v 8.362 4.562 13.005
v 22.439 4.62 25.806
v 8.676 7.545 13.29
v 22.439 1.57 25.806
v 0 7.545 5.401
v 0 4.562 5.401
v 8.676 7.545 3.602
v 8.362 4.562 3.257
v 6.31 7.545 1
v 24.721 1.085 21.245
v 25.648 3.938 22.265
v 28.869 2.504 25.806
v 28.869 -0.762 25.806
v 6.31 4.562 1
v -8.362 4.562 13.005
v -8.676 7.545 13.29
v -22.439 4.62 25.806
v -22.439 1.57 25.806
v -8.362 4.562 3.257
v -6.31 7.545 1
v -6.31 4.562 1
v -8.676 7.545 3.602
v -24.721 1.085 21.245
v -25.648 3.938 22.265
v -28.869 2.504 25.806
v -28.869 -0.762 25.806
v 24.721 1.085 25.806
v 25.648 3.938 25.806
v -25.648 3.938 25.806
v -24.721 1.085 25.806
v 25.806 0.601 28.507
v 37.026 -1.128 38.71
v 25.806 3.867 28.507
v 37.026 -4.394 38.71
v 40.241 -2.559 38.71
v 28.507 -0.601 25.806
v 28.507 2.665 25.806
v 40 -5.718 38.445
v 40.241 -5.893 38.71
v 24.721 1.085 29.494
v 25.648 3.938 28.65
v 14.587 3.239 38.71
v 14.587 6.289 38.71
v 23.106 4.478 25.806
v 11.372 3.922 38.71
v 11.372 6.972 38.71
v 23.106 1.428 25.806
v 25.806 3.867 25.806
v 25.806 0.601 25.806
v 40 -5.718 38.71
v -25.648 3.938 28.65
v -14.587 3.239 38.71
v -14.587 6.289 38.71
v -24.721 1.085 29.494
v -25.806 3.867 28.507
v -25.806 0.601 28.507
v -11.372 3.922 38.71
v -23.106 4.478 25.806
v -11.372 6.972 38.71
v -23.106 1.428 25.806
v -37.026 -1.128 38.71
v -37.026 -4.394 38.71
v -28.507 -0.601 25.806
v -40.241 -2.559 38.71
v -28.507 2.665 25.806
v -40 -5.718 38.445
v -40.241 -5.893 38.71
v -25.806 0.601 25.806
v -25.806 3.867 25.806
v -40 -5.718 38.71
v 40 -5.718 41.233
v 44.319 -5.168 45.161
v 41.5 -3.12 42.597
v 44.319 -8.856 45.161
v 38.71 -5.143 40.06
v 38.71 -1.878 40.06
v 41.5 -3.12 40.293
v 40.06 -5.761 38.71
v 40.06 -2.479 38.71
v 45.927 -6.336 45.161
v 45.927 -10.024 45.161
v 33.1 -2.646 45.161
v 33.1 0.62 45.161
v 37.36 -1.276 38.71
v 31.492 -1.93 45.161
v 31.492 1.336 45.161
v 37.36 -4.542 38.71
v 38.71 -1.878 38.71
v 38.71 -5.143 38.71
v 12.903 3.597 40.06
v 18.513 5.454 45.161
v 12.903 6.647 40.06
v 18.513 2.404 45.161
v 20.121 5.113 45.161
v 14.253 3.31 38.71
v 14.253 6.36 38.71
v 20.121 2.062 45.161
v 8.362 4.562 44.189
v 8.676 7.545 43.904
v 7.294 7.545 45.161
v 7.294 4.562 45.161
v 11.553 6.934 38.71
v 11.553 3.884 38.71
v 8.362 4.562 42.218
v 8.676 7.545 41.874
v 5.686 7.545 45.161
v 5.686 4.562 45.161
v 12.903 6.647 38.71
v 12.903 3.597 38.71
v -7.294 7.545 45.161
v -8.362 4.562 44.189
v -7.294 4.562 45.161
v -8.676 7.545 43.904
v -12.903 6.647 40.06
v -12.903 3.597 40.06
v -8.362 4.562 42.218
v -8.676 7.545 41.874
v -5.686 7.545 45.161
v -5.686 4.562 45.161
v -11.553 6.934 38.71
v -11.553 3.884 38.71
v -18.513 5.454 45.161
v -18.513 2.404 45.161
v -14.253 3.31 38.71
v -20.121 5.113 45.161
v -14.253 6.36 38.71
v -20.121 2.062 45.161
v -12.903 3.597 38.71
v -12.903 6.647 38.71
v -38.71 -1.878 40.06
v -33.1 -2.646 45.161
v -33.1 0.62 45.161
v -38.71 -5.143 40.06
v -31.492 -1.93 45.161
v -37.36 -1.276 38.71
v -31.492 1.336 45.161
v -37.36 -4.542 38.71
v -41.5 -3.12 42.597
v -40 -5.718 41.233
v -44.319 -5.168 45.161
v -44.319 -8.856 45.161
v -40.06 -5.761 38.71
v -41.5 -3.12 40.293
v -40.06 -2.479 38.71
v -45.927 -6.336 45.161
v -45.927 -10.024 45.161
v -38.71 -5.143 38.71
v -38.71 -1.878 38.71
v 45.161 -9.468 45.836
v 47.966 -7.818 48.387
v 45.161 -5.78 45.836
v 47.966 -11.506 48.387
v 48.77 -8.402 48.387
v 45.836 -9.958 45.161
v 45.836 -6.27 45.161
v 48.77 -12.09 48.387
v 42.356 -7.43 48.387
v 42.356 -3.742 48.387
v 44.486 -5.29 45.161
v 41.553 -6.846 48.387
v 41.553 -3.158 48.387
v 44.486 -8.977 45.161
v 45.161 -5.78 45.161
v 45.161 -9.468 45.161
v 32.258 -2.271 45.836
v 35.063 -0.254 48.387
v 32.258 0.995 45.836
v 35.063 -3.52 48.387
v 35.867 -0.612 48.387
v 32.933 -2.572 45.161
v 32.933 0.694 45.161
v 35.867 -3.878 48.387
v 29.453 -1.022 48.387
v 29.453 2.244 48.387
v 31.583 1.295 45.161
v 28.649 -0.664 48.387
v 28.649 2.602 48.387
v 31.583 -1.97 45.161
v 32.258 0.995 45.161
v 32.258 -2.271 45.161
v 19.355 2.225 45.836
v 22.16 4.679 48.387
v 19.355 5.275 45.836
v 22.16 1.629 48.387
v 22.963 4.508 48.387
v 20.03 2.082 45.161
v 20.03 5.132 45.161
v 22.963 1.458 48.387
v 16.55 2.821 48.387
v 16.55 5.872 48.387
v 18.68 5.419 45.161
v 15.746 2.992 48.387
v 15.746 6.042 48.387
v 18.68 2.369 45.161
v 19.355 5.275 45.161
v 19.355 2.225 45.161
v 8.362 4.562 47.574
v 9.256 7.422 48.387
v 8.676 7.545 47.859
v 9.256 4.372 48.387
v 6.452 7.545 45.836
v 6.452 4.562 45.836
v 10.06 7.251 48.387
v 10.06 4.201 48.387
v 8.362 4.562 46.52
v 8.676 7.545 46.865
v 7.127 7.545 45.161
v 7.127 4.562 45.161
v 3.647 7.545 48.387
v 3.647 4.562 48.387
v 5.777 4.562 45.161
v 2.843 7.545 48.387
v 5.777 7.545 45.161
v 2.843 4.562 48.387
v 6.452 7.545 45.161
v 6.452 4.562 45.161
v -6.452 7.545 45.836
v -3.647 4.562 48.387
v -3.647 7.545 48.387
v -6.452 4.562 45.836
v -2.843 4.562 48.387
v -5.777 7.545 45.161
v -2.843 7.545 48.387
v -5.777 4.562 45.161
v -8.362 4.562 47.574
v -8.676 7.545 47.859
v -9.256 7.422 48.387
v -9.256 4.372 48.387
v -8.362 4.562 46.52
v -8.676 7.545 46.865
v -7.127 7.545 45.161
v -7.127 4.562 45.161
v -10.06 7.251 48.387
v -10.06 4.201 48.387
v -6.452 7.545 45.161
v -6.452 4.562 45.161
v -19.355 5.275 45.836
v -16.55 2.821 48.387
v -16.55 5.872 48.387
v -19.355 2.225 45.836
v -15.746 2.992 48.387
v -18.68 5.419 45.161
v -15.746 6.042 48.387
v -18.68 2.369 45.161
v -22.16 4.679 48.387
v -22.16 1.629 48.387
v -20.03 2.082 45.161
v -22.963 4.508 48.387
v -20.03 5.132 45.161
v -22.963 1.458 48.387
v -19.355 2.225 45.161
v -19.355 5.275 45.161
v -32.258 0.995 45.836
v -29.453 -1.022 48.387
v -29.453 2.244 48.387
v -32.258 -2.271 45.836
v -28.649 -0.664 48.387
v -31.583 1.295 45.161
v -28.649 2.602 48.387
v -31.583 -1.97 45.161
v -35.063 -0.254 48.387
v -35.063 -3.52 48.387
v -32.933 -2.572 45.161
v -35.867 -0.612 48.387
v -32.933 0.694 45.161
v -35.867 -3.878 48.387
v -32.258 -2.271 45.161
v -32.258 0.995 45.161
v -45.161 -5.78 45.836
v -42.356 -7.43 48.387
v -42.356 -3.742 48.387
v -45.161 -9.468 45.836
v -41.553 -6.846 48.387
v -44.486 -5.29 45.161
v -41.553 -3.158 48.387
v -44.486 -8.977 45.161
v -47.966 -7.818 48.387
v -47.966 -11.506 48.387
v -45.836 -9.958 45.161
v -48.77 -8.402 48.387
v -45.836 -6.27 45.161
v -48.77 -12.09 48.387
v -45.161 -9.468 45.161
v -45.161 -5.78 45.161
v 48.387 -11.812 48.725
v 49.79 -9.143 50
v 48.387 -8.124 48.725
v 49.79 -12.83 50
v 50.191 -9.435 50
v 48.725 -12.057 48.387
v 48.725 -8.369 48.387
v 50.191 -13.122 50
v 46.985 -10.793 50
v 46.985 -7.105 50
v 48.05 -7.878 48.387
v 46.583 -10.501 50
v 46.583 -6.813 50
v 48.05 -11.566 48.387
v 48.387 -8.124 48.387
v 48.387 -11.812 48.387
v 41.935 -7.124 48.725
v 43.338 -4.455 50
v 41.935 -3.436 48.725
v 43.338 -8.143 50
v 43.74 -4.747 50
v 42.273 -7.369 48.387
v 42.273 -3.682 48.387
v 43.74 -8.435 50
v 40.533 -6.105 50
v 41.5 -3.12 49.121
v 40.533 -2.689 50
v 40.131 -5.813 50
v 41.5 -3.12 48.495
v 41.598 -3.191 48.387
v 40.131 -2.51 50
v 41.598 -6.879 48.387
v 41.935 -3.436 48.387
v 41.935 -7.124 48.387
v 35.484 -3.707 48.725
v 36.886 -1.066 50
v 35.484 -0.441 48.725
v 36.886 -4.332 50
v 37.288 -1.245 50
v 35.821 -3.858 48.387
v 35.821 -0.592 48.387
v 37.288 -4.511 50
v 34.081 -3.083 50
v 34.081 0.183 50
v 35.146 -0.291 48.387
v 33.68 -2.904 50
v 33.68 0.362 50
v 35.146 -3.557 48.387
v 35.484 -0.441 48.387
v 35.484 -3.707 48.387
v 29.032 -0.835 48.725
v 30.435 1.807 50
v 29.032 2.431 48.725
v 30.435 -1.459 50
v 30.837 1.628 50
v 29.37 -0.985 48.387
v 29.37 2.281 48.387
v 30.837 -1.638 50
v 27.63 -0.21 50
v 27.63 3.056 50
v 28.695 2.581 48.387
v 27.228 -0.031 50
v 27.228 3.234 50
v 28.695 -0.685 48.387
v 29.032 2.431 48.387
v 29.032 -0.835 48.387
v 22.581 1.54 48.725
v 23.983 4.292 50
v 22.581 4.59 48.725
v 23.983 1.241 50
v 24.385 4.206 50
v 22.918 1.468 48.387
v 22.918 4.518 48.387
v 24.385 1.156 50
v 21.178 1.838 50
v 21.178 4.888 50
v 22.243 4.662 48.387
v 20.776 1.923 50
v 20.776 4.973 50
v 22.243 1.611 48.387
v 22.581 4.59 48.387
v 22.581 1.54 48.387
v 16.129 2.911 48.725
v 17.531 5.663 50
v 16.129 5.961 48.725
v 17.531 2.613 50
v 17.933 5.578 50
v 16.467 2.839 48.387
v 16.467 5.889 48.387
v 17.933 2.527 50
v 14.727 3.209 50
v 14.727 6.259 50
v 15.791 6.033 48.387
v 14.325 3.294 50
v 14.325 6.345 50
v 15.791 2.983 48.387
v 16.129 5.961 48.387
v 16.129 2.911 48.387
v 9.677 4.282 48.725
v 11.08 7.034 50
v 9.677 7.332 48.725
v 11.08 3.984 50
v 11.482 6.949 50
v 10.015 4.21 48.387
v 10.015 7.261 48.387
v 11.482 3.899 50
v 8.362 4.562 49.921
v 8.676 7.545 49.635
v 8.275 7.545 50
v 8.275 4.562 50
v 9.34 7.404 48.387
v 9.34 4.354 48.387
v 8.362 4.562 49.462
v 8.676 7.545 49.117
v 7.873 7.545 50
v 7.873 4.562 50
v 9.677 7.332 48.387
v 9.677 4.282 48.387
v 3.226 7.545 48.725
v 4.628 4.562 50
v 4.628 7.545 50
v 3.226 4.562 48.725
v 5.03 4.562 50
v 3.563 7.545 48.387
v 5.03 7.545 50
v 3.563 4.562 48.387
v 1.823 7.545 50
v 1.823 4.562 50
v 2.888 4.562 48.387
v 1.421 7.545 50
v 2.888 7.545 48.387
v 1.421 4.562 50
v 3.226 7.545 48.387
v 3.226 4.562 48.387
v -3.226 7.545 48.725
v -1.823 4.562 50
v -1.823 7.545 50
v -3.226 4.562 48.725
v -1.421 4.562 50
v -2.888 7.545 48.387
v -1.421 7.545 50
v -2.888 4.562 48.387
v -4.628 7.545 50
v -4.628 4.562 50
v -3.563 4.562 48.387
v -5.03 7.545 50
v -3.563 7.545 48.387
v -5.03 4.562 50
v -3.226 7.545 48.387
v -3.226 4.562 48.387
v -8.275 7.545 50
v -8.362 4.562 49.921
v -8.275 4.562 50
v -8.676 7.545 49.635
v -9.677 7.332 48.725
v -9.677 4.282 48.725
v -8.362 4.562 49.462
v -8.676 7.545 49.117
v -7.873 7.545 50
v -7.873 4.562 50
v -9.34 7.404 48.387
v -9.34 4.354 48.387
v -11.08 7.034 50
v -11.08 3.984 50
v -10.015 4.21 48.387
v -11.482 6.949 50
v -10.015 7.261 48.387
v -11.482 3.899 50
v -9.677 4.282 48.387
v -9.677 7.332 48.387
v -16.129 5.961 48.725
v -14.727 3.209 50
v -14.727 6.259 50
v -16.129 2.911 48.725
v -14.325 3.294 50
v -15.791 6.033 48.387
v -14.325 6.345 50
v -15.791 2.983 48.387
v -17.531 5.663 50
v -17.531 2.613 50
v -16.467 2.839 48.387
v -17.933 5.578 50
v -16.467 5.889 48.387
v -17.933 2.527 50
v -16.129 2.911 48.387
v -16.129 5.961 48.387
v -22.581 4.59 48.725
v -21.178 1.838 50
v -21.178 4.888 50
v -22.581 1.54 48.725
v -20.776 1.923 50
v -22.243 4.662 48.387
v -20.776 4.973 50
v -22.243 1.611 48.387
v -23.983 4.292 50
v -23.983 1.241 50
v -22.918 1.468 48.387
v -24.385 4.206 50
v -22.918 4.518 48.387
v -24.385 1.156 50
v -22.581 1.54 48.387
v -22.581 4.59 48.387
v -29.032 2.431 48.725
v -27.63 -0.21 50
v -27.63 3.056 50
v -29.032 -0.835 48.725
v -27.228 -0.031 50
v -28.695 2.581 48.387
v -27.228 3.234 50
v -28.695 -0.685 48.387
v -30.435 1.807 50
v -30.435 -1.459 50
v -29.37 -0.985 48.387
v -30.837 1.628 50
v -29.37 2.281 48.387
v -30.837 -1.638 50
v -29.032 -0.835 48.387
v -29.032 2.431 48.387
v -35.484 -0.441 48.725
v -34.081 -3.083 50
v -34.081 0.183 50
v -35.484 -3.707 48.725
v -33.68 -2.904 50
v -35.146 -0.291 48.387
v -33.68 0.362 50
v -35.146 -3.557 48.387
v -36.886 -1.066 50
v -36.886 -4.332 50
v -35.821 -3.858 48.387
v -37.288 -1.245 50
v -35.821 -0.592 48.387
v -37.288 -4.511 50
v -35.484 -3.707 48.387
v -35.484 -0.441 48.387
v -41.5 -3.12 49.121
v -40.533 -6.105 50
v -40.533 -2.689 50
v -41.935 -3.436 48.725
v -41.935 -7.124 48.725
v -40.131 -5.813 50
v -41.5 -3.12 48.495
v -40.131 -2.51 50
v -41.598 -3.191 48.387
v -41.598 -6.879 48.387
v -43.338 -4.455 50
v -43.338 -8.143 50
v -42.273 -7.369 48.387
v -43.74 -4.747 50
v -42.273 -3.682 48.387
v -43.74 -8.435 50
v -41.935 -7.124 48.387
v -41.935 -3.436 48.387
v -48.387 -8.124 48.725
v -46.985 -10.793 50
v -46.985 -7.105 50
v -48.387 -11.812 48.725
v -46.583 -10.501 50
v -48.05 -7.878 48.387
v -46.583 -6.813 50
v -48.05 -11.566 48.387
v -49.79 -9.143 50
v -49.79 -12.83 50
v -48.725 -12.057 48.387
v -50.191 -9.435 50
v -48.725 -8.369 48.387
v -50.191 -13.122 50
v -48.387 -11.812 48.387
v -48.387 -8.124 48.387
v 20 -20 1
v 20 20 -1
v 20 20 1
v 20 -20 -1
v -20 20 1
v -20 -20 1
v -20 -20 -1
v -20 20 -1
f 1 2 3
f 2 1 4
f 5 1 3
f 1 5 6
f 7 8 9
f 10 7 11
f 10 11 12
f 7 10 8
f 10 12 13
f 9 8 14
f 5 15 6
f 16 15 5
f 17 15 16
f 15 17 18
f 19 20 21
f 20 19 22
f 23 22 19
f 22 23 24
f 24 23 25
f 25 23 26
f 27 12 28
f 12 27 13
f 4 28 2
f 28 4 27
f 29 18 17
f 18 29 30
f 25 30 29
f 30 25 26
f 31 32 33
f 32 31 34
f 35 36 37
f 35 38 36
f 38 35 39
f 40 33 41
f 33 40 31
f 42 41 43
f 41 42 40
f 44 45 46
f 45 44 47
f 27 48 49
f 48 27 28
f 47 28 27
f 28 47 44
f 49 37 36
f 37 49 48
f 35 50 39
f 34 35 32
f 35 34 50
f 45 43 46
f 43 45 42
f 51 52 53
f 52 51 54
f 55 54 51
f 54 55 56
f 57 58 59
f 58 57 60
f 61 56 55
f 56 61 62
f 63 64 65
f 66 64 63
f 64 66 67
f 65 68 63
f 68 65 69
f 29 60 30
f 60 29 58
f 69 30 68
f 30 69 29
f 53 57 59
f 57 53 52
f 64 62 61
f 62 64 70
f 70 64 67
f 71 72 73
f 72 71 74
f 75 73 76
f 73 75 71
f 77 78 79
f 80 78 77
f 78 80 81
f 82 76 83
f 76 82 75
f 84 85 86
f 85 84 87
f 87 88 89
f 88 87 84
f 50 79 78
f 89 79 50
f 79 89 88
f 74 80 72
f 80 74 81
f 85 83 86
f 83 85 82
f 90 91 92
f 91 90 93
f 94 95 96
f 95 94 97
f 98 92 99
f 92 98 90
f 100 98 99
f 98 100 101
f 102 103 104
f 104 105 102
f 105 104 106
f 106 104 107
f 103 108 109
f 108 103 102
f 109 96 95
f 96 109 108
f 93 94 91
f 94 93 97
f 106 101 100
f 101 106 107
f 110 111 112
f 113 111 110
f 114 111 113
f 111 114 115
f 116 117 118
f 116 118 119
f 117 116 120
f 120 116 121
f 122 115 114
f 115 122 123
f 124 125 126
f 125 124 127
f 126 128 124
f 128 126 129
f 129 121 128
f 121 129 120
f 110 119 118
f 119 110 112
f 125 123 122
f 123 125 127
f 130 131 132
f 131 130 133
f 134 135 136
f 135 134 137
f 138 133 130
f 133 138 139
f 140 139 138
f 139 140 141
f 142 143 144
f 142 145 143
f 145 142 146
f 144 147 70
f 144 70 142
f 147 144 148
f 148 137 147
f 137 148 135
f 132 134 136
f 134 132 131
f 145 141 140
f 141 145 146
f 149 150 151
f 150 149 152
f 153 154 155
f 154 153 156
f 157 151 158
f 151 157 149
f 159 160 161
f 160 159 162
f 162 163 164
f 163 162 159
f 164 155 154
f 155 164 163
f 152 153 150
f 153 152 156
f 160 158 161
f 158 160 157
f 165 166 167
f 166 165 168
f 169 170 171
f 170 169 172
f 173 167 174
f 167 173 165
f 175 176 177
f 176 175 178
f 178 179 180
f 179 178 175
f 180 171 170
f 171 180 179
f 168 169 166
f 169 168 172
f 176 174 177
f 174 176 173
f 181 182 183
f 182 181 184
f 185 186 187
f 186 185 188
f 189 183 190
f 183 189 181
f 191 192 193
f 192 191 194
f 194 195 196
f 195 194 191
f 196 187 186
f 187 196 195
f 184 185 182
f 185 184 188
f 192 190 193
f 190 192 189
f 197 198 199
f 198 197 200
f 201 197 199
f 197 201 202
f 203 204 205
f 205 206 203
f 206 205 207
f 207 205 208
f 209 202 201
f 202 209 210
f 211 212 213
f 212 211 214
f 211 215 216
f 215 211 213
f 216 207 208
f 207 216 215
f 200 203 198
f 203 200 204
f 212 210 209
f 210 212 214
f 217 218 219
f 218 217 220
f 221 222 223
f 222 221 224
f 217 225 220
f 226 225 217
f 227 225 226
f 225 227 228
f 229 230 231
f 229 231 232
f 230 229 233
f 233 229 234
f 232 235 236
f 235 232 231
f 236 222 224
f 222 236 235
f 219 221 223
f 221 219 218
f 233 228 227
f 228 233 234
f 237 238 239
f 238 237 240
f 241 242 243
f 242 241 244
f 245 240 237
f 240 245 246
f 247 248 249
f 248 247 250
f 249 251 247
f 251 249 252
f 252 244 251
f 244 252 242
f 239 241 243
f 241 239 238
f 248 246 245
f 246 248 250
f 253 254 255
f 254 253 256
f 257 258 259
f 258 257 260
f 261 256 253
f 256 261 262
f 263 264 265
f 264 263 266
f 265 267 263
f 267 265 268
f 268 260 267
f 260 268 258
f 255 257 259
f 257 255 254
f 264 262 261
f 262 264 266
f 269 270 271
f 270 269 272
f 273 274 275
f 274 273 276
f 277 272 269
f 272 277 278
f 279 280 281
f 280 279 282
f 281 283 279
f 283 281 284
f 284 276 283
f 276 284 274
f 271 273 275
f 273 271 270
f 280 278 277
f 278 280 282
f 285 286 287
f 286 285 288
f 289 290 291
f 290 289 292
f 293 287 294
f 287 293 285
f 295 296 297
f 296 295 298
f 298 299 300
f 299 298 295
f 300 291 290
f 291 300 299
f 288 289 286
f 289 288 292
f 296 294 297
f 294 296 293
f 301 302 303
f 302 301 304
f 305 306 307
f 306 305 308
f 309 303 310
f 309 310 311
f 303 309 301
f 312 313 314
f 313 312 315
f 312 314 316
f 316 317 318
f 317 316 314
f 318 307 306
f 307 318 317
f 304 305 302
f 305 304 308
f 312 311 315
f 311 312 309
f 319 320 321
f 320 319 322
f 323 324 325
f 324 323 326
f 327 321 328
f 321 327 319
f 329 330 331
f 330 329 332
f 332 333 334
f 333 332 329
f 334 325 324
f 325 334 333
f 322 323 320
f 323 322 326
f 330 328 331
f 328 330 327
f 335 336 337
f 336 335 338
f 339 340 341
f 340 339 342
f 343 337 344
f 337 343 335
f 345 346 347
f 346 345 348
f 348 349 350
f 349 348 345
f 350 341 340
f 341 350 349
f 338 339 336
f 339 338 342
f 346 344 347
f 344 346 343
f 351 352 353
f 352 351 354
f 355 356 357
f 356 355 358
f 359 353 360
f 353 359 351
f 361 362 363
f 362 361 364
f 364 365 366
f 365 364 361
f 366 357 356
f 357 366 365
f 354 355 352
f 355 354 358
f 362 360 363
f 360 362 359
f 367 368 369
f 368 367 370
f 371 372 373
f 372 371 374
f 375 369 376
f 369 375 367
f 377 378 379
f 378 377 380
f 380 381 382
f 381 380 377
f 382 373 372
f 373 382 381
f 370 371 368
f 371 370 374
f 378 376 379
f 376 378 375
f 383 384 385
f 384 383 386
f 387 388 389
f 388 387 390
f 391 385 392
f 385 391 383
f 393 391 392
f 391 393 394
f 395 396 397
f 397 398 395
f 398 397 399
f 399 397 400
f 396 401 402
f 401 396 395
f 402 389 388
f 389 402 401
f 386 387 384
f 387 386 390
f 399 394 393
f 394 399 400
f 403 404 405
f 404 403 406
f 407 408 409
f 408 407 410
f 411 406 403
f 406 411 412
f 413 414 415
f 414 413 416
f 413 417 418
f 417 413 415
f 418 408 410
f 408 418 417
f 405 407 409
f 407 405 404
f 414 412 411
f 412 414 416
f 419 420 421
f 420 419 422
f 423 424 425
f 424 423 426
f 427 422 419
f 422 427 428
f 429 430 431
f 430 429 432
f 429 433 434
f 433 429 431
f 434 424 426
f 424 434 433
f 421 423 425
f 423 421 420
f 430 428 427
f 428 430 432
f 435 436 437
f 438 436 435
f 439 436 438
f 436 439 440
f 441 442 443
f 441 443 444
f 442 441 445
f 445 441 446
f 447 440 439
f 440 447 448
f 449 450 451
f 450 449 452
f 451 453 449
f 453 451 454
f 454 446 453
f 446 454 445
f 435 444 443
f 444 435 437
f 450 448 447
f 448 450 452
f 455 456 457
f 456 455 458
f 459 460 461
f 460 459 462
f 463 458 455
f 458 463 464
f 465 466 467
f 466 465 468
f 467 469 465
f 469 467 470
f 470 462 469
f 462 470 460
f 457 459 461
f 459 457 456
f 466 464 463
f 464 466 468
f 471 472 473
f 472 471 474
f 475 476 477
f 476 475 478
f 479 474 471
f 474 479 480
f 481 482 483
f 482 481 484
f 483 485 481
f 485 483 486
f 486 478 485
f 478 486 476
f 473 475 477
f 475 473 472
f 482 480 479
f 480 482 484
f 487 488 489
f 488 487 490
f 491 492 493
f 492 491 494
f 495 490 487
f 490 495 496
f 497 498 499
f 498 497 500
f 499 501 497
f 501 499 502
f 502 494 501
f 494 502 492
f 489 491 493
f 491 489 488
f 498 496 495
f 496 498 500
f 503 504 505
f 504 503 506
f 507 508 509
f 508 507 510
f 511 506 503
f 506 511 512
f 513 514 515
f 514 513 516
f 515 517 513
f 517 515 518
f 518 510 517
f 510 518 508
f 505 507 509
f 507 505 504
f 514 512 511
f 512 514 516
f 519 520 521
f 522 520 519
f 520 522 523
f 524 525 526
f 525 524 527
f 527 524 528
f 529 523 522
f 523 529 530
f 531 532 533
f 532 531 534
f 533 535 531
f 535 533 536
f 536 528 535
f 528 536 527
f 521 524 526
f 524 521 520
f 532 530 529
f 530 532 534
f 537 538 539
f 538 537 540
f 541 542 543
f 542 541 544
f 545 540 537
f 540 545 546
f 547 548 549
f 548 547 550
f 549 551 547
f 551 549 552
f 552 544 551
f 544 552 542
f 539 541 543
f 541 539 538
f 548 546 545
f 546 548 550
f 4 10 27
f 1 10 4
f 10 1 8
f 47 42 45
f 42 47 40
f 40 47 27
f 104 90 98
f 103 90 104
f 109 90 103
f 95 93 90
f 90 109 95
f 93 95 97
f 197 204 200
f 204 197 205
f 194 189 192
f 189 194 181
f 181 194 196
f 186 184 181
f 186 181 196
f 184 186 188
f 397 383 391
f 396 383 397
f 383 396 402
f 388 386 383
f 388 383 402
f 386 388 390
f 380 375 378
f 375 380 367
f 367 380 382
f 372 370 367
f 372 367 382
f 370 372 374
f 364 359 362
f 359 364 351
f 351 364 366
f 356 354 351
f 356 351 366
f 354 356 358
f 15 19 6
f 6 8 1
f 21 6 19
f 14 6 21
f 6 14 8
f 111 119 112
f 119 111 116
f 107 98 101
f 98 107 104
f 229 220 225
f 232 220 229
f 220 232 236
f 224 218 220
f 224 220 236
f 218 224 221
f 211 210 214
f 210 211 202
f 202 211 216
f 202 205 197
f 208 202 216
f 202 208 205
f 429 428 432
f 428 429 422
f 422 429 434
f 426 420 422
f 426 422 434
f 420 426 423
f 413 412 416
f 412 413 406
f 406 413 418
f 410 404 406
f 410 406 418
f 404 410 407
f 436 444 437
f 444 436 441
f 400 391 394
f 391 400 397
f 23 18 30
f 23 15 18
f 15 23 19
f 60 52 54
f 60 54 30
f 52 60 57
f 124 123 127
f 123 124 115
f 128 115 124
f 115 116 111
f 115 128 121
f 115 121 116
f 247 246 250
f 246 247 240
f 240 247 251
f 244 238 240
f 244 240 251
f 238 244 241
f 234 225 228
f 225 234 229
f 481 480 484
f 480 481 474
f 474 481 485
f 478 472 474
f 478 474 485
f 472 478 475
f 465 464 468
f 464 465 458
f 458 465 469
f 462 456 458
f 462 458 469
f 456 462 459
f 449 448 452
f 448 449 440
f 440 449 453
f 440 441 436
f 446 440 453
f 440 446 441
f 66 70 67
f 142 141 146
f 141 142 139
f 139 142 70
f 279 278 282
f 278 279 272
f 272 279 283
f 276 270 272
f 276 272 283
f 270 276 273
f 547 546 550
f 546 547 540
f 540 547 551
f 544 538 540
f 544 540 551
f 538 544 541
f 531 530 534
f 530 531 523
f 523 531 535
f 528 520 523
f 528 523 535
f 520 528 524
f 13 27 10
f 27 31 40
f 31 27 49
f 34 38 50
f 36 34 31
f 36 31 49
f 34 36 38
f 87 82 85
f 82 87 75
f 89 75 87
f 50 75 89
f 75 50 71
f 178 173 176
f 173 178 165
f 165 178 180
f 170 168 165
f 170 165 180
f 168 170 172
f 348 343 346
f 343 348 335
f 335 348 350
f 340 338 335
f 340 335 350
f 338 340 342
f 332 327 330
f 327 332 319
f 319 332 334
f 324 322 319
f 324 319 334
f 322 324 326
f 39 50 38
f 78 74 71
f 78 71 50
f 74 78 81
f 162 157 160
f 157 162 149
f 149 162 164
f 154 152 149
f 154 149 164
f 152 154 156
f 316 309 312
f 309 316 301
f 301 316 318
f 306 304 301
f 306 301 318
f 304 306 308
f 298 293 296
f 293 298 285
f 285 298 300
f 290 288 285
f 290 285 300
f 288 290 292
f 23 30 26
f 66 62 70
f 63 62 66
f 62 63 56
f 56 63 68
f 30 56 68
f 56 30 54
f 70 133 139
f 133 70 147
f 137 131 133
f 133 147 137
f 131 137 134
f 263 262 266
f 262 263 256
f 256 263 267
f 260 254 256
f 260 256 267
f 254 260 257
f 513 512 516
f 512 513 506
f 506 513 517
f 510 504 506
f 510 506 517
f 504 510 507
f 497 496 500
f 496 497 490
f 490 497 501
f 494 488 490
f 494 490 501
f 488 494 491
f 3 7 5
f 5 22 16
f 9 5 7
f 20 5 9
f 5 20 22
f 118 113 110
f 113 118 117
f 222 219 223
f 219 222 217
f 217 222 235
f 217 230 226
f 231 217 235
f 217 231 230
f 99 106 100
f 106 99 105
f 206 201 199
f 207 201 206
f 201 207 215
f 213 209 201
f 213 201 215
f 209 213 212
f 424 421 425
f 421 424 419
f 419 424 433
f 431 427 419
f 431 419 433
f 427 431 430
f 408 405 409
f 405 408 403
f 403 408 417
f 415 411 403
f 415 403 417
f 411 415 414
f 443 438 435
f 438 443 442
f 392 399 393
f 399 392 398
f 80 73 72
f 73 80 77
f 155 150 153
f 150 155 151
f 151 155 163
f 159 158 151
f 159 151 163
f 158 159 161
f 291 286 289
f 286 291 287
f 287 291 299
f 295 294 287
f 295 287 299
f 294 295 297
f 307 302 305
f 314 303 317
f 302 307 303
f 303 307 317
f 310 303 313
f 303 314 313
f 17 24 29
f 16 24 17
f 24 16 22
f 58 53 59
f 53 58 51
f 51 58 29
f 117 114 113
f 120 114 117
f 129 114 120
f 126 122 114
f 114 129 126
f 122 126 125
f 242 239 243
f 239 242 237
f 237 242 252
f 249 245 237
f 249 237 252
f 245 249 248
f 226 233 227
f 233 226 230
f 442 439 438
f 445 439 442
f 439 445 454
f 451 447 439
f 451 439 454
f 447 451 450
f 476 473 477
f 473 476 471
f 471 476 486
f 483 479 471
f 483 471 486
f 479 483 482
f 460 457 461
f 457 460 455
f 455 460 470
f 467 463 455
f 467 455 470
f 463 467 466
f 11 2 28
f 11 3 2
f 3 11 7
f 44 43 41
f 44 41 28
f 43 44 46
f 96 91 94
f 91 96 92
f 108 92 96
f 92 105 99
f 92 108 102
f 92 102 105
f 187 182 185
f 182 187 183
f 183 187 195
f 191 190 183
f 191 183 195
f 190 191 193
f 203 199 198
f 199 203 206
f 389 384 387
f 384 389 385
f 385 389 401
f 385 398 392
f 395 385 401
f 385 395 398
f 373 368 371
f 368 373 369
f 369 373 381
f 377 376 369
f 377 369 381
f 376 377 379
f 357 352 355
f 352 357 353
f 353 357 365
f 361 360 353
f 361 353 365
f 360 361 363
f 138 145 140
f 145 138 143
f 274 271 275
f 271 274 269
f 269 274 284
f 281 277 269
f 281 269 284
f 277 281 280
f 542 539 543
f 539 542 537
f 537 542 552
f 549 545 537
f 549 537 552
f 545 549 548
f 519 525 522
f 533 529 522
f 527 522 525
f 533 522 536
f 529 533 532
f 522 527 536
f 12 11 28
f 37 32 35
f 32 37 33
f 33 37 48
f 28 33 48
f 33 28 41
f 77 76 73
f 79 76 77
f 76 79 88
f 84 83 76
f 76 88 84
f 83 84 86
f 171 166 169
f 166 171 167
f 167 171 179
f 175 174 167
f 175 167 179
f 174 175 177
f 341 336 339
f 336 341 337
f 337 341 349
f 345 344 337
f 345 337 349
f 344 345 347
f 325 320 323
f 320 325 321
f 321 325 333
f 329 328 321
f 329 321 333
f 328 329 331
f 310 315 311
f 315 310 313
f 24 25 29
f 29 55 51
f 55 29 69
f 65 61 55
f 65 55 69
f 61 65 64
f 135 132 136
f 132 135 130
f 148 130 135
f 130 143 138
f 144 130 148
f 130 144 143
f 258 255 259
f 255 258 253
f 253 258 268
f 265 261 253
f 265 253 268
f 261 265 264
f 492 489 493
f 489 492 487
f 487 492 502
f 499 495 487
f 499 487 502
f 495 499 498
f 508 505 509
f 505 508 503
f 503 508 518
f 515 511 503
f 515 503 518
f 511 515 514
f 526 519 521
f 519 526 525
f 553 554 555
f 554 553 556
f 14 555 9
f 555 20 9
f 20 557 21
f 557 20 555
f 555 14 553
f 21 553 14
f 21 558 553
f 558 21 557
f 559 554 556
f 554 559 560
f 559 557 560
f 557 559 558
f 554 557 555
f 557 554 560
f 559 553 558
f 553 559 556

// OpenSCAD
// make a tree of TN thick cubes of NUM LEVEL levels, HT high

TN = 3;
HT = 50;
NUM_LEVELS=4;
BASE_WD=8;

sqrt2 = sqrt(2);


function get_half_width(num_levels,ht,level=1) = 
    num_levels < num_levels
        ? ((1/pow(2,level)) * ht) + get_half_width(num_levels,ht,level+1)
        : ((1/pow(2,level)) * ht);

module make_branch_fork(layer_ht,wid,tn){
    // makes a 45 deg tilted branch of length leng,
    // width wid and
    // with base at 0,0 and ends trimmed flat
    leng = layer_ht * sqrt2+ (wid /sqrt2);
    difference(){
        // the 2 branches
        thin_wd = wid/2;
        tapered_branch_pts = [
            [-thin_wd/2,leng/2],
            [thin_wd/2,leng/2],
            [wid/2,-leng/2],
            [-wid/2,-leng/2]
        ];
        union(){
            rotate(45,[0,1,0]){
                translate([0,tn/2,leng/2]){
                    //cube([wid,tn,leng],center=true);
                    rotate(90,[1,0,0]){
                        linear_extrude(height=tn){
                            polygon(tapered_branch_pts);
                        }
                    }
                }
            }
            rotate(-45,[0,1,0]){
                translate([0,tn/2,leng/2]){
                    //cube([wid,tn,leng],center=true);
                    rotate(90,[1,0,0]){
                        linear_extrude(height=tn){
                            polygon(tapered_branch_pts);
                        }
                    }
                }
            }
        }

        // trim the ends flat
        translate([0,0,((wid/2)*sqrt2*1.1)/-2]){
            cube([wid*sqrt2*1.1,tn*1.1,(wid/2)*sqrt2*1.1],center=true);
        }
        translate([layer_ht/sqrt2+wid*sqrt2*1.3-wid/sqrt2,
                    0,
                    ((wid/2)*sqrt2*1.5)/2 + layer_ht]){
            cube([wid*sqrt2*1.5,tn*1.1,(wid/2)*sqrt2*1.5],center=true);
        }
        translate([-layer_ht/sqrt2-wid*sqrt2*1.3+wid/sqrt2,
                    0,
                    ((wid/2)*sqrt2*1.5)/2 + layer_ht]){
            cube([wid*sqrt2*1.5,tn*1.1,(wid/2)*sqrt2*1.5],center=true);
        }
    }
}

//######################################################
// from https://en.wikibooks.org/wiki/OpenSCAD_User_Manual/Tips_and_Tricks#Add_all_values_in_a_list
function sum(v) = [for(p=v) 1]*v;

function fst_ht(ht,lnum) =
    pow(2,(lnum-1))/((pow(2,lnum) -1)) * ht;

function make_ht_seq(ht,lnum) = 
    lnum > 1 
    ? concat([fst_ht(ht,lnum)],make_ht_seq(ht-fst_ht(ht,lnum),lnum-1))
    :[ht];

echo("HTSEQQQ:",make_ht_seq(10,3));

function chop_off_end(the_list) = 
    len(the_list)>1
    ? [for(i = [0:len(the_list)-2] ) the_list[i]]
    : [];

//echo("CHOP:",chop_off_end([1,2,3,4]));

function make_posi_seq(htseq) = 
    len(htseq) > 1 
    ? concat(make_posi_seq(chop_off_end(htseq)),[sum(htseq)])
    :[0,htseq[0]];
//echo("POSI:",make_posi_seq([1,2,3,4]));
//###################################################################






// module make_whole_tree(ht,num_levels,wid,tn){

module make_tree(ht,num_levels,wid,tn){
    // need to calc the heights of each fork layer
    // assuming that each layer is half the height 
    // of the previous one

    
    whole_seq = make_ht_seq(ht,num_levels);
    whole_posi_seq = make_posi_seq(whole_seq);
    echo("WHOLE ht:",whole_seq);
    echo("WHOLE posi:",whole_posi_seq);

    echo("sum=",0.333333+ 0.166667+ 0.0833333);

    for(layer_num = [0:num_levels-1]){
        wid_coeff = 1/pow(2,layer_num);
        this_ht = whole_seq[layer_num];
        ht_posi = whole_posi_seq[layer_num];

        for(fork_num = [1:pow(2,layer_num)]){
            translate([ht_posi - (fork_num-1)*4*this_ht ,0,ht_posi]){
                make_branch_fork(this_ht,wid*wid_coeff,tn);
            }
        }
    }
}

intersection(){
    difference(){
        make_tree(HT,NUM_LEVELS+1,BASE_WD,30);
        translate([0,-75,-1]){
            cylinder(h=120,r=80);
        }
    }
    translate([0,-75,-1]){
        cylinder(h=120,r=83);
    }
}
cube([40,40,2],center=true);

// arr = [2,4,6,8];
// echo("XXX",arr[1]);


// make_branch_fork(25,BASE_WD,TN);





// fiftyht = get_half_width(4,50);

// //echo("FIFTYHT=",fiftyht);

// // // we will be having a 45 deg tilt on each branch
// tree_width = 2 * get_half_width(NUM_LEVELS,HT);

// // for(layer=[1:NUM_LEVELS]){
// //     ht=(1/pow(2,layer)) * HT;
    
// //     for(bases = [1:layer]){

// //     }
// // }
